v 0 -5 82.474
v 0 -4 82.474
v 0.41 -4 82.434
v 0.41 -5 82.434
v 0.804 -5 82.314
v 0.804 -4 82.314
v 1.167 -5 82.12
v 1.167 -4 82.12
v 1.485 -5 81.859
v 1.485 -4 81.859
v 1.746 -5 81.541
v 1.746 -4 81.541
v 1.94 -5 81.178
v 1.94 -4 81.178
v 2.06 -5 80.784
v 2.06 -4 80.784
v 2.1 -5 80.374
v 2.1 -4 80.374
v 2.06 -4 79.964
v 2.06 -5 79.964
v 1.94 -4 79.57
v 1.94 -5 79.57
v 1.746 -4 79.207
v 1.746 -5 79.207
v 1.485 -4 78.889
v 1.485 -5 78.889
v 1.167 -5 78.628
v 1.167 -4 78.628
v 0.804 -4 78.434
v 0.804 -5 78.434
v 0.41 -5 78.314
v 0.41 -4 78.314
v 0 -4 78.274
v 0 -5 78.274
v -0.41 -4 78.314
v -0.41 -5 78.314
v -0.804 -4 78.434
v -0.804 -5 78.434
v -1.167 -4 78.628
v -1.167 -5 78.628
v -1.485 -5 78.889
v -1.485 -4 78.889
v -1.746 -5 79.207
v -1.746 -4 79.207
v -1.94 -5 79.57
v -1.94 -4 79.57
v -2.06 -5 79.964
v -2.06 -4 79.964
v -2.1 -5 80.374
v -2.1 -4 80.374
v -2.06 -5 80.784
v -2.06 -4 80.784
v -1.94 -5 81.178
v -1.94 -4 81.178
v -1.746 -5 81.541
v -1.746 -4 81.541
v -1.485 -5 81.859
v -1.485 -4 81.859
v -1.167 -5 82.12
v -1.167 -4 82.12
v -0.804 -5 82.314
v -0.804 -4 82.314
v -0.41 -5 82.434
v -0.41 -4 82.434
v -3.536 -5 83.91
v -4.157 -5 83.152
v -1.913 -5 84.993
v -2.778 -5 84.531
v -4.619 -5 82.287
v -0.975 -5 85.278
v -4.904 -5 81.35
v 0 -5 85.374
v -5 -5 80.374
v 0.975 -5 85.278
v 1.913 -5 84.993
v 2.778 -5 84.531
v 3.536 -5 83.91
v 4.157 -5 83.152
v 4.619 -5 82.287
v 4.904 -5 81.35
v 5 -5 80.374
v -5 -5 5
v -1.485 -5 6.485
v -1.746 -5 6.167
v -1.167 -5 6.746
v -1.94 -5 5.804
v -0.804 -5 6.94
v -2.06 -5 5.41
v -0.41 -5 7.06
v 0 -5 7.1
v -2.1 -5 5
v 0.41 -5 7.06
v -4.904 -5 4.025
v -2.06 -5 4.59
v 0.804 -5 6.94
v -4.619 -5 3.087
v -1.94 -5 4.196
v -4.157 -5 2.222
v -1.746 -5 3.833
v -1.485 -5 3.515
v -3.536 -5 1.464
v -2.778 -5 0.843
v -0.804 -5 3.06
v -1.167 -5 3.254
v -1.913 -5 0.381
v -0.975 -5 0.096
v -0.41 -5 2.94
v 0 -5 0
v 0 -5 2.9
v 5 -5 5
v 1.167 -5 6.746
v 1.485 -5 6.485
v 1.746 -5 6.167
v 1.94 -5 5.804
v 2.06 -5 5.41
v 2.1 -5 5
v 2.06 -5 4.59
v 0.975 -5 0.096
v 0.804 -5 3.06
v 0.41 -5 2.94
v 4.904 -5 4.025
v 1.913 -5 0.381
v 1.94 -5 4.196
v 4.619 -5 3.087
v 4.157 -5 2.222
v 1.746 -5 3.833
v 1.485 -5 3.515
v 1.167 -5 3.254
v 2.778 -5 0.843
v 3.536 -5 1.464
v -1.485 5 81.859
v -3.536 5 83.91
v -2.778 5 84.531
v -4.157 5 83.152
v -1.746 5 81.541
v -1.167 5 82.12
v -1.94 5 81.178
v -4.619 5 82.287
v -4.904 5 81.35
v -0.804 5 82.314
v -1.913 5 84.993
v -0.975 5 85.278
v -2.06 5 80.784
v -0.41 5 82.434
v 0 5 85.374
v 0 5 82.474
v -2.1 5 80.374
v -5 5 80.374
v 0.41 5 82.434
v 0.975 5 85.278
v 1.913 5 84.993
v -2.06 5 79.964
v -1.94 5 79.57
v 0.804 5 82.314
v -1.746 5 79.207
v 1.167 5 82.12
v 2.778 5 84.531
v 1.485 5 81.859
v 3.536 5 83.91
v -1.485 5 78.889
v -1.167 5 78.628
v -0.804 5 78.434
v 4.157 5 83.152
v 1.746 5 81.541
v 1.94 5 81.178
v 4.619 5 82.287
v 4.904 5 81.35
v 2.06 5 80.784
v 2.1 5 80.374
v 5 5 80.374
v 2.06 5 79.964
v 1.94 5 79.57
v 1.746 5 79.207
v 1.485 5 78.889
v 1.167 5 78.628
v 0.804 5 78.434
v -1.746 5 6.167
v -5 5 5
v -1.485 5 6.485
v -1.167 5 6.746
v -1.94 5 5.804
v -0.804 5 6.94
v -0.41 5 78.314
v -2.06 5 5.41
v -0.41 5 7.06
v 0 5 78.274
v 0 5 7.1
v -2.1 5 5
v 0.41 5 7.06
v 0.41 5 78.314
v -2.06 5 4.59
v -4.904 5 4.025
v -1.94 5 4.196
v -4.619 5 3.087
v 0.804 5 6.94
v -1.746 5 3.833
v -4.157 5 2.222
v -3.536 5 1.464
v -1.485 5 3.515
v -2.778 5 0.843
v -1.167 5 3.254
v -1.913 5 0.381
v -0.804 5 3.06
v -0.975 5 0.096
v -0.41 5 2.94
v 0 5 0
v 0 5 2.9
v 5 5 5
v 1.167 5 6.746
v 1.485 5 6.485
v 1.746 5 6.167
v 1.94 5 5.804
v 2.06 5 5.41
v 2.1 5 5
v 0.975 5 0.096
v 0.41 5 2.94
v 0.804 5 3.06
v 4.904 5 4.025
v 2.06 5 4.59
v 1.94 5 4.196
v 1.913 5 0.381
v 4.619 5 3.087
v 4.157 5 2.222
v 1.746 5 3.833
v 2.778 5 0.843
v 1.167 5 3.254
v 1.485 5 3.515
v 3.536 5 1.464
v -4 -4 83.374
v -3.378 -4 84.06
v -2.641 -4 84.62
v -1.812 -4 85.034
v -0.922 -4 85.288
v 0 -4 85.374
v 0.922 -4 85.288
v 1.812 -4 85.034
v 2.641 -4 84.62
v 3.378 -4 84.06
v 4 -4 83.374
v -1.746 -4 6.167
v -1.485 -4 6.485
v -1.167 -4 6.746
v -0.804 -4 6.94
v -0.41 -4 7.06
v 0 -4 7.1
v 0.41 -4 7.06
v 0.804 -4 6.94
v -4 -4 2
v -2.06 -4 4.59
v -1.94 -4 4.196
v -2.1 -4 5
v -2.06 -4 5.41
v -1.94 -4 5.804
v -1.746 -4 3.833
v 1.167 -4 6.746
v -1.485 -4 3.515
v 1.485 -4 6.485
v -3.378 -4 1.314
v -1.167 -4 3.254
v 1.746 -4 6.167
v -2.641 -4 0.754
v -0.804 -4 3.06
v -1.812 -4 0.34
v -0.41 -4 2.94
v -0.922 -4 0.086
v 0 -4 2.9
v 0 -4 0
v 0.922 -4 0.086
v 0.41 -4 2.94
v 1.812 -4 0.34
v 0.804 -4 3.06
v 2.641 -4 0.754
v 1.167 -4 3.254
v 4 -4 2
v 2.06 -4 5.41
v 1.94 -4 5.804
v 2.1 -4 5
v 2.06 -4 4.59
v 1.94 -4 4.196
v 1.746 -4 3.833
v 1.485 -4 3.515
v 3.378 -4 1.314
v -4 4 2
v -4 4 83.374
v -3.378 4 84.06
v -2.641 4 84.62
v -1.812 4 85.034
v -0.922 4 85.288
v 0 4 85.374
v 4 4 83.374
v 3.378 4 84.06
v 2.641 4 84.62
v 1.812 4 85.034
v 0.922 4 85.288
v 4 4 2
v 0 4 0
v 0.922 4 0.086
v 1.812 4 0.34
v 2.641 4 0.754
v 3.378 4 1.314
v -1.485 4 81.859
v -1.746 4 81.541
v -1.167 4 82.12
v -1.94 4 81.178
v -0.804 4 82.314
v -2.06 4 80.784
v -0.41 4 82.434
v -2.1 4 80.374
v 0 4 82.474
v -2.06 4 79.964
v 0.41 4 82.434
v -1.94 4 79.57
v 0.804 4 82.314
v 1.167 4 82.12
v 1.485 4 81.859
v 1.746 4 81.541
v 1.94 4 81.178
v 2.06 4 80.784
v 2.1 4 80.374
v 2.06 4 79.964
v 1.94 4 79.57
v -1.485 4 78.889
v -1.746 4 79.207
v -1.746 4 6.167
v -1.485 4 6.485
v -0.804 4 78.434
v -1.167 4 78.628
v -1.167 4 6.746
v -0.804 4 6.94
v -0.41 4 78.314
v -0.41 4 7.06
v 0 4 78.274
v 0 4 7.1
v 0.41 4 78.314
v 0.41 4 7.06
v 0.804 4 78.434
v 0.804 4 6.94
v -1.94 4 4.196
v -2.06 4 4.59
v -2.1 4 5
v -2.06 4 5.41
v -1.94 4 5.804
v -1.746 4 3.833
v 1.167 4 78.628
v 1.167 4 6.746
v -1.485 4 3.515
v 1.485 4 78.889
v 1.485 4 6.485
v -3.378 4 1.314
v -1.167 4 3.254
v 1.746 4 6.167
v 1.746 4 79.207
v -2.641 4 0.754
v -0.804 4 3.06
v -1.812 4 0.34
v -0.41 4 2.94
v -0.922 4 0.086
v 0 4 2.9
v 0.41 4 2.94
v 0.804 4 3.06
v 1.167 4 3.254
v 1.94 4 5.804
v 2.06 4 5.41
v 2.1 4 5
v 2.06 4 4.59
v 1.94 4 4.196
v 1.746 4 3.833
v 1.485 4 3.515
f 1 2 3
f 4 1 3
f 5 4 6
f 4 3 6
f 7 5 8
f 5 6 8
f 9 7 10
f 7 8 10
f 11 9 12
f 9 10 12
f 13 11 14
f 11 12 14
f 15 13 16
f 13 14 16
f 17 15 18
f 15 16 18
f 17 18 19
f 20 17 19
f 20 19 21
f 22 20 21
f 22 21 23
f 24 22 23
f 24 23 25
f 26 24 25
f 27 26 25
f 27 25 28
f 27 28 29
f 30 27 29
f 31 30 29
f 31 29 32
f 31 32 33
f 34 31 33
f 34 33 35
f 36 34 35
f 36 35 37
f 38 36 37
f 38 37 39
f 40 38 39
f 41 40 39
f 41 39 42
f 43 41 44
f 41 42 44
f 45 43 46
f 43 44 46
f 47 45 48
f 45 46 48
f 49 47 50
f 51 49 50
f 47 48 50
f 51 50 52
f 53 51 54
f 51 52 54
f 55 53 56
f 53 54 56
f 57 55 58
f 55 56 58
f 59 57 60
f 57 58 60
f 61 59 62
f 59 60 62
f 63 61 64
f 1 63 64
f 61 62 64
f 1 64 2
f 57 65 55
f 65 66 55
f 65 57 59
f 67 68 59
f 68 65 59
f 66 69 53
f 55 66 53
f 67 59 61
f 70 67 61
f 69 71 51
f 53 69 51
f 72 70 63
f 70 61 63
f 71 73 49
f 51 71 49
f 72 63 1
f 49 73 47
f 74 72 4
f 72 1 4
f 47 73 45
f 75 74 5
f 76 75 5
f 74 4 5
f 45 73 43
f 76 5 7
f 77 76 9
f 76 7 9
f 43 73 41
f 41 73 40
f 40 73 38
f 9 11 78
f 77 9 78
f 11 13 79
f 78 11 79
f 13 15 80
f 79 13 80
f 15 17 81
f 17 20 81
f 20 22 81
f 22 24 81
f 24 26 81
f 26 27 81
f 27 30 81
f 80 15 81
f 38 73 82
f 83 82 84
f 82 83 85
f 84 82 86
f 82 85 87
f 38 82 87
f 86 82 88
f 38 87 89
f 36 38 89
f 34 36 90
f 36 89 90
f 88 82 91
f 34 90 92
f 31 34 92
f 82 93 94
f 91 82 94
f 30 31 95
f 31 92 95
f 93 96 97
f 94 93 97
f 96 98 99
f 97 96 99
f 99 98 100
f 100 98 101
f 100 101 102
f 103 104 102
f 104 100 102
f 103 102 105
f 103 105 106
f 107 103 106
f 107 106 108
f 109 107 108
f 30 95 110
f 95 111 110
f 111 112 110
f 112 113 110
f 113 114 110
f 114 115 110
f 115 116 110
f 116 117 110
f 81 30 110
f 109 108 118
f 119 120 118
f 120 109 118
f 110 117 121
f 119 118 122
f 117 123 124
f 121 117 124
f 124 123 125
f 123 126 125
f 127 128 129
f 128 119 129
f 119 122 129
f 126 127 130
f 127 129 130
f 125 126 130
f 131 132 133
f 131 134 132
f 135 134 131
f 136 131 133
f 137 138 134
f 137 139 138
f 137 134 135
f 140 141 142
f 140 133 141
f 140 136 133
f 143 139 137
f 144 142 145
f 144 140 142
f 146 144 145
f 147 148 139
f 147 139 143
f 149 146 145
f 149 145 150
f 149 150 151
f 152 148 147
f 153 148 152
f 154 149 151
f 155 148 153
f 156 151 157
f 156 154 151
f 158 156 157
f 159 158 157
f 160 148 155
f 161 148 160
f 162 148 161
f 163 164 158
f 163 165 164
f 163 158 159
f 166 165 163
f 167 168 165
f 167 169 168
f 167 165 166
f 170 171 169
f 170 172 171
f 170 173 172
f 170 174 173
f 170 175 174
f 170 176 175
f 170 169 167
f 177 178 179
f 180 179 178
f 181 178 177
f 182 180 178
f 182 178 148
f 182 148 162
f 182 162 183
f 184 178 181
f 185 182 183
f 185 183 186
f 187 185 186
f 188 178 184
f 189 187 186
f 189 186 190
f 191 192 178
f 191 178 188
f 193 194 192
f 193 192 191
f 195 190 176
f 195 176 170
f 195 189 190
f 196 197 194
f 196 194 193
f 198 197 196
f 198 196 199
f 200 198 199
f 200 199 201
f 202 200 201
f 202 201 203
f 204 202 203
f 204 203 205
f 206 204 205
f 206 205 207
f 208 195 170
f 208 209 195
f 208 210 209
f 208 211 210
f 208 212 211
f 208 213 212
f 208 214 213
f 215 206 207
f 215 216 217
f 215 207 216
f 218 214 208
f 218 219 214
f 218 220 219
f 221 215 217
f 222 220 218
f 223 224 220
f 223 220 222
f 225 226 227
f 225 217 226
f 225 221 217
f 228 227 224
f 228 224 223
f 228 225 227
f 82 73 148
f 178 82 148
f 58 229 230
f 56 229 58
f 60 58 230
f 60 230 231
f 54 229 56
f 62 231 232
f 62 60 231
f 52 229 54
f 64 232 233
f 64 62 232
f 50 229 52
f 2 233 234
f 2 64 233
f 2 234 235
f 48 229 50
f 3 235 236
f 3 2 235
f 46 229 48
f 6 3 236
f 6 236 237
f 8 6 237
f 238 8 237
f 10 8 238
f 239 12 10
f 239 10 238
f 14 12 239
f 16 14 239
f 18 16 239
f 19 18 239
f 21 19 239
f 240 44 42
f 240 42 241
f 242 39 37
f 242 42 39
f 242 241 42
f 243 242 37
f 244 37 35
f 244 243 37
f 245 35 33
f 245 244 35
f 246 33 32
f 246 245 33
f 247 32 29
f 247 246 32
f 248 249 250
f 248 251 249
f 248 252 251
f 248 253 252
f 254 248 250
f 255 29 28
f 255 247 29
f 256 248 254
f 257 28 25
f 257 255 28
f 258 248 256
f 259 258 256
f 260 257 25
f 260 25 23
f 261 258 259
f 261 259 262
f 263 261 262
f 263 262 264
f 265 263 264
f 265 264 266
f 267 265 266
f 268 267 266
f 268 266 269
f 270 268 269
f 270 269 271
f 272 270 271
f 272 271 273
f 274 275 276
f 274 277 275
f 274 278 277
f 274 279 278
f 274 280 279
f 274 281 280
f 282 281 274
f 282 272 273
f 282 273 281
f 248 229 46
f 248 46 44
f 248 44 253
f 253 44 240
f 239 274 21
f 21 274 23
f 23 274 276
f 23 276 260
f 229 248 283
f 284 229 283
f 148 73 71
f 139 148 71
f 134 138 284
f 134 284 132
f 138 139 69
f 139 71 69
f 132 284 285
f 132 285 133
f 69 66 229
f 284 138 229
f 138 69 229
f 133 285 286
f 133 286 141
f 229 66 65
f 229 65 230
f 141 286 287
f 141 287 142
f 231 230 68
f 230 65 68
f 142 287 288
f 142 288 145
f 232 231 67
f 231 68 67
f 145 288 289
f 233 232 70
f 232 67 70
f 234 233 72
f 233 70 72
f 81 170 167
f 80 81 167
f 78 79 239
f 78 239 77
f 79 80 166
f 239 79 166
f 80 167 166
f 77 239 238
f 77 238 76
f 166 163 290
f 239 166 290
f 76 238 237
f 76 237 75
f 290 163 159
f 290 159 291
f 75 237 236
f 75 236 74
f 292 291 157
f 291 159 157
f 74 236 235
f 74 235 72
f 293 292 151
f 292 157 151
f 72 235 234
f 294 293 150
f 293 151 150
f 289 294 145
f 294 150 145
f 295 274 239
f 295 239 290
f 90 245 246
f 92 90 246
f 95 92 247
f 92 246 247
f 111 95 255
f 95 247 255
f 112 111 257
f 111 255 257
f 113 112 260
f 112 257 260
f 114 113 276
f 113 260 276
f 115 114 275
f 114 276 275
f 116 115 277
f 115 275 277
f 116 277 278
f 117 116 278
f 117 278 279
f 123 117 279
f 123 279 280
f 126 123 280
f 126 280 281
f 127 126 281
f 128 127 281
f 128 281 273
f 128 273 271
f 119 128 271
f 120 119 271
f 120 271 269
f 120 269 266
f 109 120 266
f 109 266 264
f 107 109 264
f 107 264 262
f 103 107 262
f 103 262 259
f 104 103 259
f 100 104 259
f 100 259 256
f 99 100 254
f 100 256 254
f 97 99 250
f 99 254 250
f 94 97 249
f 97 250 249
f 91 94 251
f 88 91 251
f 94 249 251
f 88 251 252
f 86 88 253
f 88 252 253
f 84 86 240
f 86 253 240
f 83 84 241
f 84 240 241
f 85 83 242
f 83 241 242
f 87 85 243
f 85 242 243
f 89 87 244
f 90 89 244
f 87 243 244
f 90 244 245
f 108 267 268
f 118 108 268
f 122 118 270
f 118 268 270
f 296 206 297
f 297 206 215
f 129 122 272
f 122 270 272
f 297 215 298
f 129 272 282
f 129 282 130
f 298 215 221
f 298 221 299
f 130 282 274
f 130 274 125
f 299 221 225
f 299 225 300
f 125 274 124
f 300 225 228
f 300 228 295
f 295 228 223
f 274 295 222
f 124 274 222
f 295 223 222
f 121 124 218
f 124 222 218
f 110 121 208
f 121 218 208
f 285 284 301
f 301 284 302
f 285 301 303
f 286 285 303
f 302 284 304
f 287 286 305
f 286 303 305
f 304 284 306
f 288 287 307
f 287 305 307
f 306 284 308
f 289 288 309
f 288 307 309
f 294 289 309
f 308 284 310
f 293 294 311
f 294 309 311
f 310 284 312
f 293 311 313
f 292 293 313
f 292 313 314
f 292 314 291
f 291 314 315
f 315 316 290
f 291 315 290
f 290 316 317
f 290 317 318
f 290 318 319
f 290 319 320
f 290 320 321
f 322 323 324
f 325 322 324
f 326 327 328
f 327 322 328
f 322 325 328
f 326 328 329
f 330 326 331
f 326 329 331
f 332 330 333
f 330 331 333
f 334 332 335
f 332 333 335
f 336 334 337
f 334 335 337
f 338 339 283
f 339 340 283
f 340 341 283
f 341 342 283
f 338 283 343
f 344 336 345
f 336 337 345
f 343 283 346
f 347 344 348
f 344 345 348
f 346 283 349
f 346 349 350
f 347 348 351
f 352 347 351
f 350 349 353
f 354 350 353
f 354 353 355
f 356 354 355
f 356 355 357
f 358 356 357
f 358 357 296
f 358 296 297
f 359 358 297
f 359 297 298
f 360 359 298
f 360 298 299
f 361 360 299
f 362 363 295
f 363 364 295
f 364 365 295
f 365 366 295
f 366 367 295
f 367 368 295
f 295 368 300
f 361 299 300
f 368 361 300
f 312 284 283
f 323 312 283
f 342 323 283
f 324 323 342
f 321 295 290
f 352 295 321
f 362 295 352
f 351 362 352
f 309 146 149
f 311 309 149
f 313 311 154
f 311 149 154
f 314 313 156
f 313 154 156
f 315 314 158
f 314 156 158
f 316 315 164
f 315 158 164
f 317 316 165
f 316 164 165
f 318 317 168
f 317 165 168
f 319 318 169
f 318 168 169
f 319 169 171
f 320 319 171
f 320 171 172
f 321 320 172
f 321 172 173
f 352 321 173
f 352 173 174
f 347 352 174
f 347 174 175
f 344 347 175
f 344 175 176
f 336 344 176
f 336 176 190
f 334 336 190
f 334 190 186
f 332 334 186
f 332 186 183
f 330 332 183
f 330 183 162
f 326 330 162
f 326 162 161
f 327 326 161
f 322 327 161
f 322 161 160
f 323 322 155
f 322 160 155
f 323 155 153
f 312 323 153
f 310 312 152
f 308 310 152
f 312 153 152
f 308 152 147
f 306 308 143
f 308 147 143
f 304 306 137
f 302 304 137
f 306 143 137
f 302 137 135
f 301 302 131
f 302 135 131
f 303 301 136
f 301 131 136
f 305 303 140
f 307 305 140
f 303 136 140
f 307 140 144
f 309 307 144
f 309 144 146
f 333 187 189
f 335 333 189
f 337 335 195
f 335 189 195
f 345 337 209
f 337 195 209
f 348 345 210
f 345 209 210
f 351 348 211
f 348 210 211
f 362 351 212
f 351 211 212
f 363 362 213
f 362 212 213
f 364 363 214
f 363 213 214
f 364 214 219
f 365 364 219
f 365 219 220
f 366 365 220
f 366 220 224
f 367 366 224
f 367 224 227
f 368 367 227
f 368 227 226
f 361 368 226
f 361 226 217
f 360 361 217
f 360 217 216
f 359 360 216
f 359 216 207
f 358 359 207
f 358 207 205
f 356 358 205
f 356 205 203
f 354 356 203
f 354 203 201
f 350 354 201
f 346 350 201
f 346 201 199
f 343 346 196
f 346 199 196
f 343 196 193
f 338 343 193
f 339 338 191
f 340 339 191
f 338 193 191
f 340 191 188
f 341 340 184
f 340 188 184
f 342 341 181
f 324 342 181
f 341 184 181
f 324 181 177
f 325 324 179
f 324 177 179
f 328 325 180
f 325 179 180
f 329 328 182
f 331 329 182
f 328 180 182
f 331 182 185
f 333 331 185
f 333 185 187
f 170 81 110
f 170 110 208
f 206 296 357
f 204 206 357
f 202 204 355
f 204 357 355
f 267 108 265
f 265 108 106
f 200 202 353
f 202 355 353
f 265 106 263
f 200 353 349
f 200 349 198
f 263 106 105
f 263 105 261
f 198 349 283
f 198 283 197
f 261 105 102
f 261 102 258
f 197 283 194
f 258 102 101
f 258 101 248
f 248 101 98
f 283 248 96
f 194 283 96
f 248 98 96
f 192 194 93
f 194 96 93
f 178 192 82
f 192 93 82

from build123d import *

# Parameters (mm, degrees)
SKETCH_1_W          = 10
SKETCH_1_H          = 10
SKETCH_1_W_2        = 8
SKETCH_1_H_2        = 8
EXTRUDE_1_DEPTH     = 85.374067158
SKETCH_2_R          = 2.1
CUT_EXTRUDE_1_DEPTH = 40
FILLET_1_R          = 5


with BuildPart() as part:
    # ｽｹｯﾁ1 → ﾎﾞｽ - 押し出し1 (new body)
    with BuildSketch(Plane.XY):
        Rectangle(SKETCH_1_W, SKETCH_1_H)
        Rectangle(SKETCH_1_W_2, SKETCH_1_H_2, mode=Mode.SUBTRACT)
    extrude(amount=EXTRUDE_1_DEPTH)

    # ｽｹｯﾁ2 → ｶｯﾄ - 押し出し1 (cut)
    with BuildSketch(Plane(origin=(0, 5, 0), x_dir=(1, 0, 0), z_dir=(0, 1, 0))):
        with Locations(Location((0, -5, 0), (0, 0, 270))):
            Circle(SKETCH_2_R)
        with Locations(Location((0, -80.374067158, 0), (0, 0, 270))):
            Circle(SKETCH_2_R)
    extrude(amount=-CUT_EXTRUDE_1_DEPTH, mode=Mode.SUBTRACT)

    # ﾌｨﾚｯﾄ1
    # the kernel refuses this fillet: 5 mm, written as the material it takes off along each edge
    with BuildSketch(Plane(origin=(5, 17.5, 85.374067158), x_dir=(-1, 0, 0), z_dir=(0, -1, 0)), Plane(origin=(-5, -17.5, 0), x_dir=(0, 0, 1), z_dir=(0, 1, 0))) as fillet_1_piece_1:
        with BuildLine():
            CenterArc((FILLET_1_R, FILLET_1_R), FILLET_1_R, 180, 90)
            Line((0, FILLET_1_R), (0, 0))
            Line((0, 0), (FILLET_1_R, 0))
        make_face()
    extrude(amount=35, mode=Mode.SUBTRACT)
    with BuildSketch(Plane(origin=(-5, -17.5, 85.374067158), x_dir=(0, 0, -1), z_dir=(0, 1, 0)), Plane(origin=(5, 17.5, 0), x_dir=(-1, 0, 0), z_dir=(0, -1, 0))) as fillet_1_piece_2:
        with BuildLine():
            CenterArc((FILLET_1_R, -FILLET_1_R), FILLET_1_R, 90, 90)
            Line((0, -FILLET_1_R), (0, 0))
            Line((0, 0), (FILLET_1_R, 0))
        make_face()
    extrude(amount=35, mode=Mode.SUBTRACT)


solid = part.part
